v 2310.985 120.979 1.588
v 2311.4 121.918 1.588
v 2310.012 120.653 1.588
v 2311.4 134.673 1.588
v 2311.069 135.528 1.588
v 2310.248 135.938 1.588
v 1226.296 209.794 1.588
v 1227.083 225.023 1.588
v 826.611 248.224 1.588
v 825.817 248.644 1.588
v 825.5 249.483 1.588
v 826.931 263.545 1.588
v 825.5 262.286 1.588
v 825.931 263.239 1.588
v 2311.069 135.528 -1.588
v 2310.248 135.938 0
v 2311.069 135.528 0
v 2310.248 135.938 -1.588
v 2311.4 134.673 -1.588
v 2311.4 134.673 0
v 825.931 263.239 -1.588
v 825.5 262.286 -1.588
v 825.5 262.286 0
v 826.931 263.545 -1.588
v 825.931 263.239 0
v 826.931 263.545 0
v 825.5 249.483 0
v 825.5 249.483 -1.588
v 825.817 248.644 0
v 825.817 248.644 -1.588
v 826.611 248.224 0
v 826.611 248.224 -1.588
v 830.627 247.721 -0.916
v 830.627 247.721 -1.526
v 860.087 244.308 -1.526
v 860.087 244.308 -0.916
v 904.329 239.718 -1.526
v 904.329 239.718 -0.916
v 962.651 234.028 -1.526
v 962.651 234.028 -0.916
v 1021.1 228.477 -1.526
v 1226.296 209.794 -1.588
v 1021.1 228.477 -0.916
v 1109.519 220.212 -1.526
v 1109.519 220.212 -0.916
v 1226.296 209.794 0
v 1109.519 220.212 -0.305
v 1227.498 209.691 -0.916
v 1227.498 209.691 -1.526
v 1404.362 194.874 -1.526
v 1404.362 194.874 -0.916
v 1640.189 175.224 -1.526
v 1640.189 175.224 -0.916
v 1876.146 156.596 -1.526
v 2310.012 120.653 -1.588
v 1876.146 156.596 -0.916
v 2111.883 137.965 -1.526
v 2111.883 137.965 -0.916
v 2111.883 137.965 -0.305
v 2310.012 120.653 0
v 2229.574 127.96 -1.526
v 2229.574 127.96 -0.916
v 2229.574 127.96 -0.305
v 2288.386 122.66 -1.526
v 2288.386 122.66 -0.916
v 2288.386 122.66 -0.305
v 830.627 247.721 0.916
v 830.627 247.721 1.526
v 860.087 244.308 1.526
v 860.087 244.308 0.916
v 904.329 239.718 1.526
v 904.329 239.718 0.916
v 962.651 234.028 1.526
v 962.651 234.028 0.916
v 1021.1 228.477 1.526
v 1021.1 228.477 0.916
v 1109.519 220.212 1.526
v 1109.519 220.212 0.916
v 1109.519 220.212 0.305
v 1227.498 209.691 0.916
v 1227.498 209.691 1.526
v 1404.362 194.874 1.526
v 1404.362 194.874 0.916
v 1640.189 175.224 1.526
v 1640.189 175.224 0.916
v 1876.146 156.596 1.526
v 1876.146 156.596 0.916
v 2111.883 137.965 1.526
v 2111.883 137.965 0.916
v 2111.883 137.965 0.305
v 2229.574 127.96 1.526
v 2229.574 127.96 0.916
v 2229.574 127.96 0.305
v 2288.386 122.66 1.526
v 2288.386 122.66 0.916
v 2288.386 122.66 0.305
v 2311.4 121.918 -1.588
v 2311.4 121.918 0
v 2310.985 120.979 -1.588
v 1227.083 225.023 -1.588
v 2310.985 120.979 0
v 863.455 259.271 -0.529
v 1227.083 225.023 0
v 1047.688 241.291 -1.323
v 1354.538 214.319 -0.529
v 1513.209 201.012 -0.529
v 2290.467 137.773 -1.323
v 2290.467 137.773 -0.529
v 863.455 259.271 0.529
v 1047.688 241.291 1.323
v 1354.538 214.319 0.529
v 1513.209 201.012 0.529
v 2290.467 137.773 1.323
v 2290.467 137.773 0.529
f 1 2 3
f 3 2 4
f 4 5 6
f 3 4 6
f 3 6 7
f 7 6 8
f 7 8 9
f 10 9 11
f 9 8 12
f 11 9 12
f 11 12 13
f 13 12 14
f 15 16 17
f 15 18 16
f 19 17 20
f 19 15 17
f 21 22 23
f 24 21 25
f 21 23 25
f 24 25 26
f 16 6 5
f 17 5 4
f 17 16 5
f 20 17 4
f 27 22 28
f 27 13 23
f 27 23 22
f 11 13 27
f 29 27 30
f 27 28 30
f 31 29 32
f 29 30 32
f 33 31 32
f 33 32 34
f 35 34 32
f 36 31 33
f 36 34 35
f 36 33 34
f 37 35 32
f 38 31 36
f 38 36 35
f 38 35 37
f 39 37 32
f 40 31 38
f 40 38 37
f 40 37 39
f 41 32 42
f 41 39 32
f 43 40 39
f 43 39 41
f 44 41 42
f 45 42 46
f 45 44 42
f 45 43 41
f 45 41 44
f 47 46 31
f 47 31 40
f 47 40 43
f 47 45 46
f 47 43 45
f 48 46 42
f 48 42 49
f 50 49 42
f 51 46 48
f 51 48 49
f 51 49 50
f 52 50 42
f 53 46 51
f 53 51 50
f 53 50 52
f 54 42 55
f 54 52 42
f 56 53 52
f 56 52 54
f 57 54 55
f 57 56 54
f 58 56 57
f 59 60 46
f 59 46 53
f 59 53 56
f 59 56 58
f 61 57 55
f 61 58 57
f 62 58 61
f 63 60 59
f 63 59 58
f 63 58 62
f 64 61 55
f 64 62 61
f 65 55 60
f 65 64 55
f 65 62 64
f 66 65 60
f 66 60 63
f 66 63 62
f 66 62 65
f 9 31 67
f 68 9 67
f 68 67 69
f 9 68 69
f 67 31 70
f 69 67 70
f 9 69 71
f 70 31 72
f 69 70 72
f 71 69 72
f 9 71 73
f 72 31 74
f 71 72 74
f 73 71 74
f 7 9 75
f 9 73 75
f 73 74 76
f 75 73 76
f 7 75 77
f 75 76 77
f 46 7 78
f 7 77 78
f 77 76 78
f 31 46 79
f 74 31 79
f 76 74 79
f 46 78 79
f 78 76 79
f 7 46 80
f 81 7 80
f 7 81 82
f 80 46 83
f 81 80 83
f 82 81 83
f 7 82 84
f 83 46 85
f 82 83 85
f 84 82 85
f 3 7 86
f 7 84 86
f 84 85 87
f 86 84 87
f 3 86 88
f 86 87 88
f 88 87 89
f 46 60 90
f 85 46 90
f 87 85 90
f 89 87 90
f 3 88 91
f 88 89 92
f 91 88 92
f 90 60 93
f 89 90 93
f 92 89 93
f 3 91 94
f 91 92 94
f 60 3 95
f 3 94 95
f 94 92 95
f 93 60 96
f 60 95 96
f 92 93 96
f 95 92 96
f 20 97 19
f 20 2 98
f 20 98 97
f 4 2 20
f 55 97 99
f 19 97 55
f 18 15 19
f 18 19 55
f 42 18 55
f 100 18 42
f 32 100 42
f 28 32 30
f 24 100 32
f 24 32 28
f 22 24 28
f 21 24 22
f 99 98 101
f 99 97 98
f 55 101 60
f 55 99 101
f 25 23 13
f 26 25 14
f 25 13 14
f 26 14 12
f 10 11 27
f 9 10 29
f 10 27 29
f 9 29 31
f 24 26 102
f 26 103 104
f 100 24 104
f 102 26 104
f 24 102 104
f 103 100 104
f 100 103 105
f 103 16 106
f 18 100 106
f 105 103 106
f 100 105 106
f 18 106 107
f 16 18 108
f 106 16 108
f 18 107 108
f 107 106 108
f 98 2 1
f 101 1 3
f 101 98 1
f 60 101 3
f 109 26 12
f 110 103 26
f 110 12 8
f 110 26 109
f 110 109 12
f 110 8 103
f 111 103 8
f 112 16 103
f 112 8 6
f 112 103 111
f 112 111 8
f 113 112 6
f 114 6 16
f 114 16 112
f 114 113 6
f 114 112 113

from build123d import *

# Parameters (mm, degrees)
BOSS_EXTRUDE1_DEPTH = 1.5875
FILLET1_R           = 1.27


with BuildPart() as part:
    # Sketch2 → Boss-Extrude1 (new body, symmetric)
    with BuildSketch(Plane.XY):
        with BuildLine():
            add(Edge.make_bspline(
                [(825.5, 263.72872798), (833.004293944, 262.763036085), (840.535916247, 261.846014478), (848.126574562, 260.964164828), (892.90639318, 255.945629274), (937.686211733, 251.779150949), (973.452075064, 248.227669425), (1071.946672141, 239.051054038), (1170.441269319, 229.731506738), (1231.791940344, 224.503945813), (1324.899336146, 216.790627817), (1418.006730935, 209.040117978), (1449.742935921, 206.361809936), (1636.928606778, 190.521130342), (1824.114277635, 175.409157235), (1979.966947376, 164.299650253), (2139.396932204, 151.743219852), (2298.826916202, 137.00172879), (2303.011455291, 136.613290392), (2307.202438398, 136.22270903), (2311.4, 135.829939705)],
                knots=[78.681340958, 78.681340958, 78.681340958, 78.681340958, 78.681340958, 78.681340958, 82.46579272, 82.46579272, 82.46579272, 100.7932901, 100.7932901, 100.7932901, 131.0989539, 131.0989539, 131.0989539, 146.7691983, 146.7691983, 146.7691983, 223.5339586, 223.5339586, 223.5339586, 225.60075304, 225.60075304, 225.60075304, 225.60075304, 225.60075304, 225.60075304], degree=5))
            Line((825.5, 263.72872798), (825.5, 248.364439806))
            add(Edge.make_bspline(
                [(825.5, 248.364439806), (827.20768691, 248.14708351), (833.784664511, 247.321927102), (845.28106727, 245.953419483), (860.086531547, 244.295598067), (879.830703434, 242.186646028), (904.369967092, 239.698279806), (933.571022669, 236.832150625), (962.642718041, 234.023667741), (991.762593943, 231.241975908), (1021.072010315, 228.475862291), (1060.376437315, 224.796956681), (1109.513015577, 220.184378862), (1168.511190361, 214.817071985), (1227.500129793, 209.662054042), (1306.133167947, 203.021178328), (1404.361477105, 194.920725932), (1522.239851071, 184.918066624), (1640.182856491, 175.167007786), (1758.165352567, 165.757639485), (1876.155384769, 156.590937079), (1994.08749188, 147.453250142), (2092.268692061, 139.624216053), (2170.748029042, 133.079656729), (2219.771730977, 128.842227836), (2258.983988247, 125.347211495), (2286.236620906, 122.865952448), (2303.710498295, 121.243617864), (2311.4, 120.523308441)],
                knots=[78.875303138, 78.875303138, 78.875303138, 78.875303138, 79.386176103, 80.841530691, 82.29688528, 83.752239868, 86.662949044, 89.57365822, 92.484367397, 95.395076573, 98.305785749, 101.216494926, 107.037913278, 112.859331631, 118.680749984, 124.502168336, 136.145005042, 147.787841747, 159.430678452, 171.073515158, 182.716351863, 194.359188568, 206.002025273, 211.823443626, 217.644861979, 220.555571155, 223.466280331, 225.740445061, 225.740445061, 225.740445061, 225.740445061], degree=3))
            Line((2311.4, 120.523308441), (2311.4, 135.829939705))
        make_face()
    extrude(amount=BOSS_EXTRUDE1_DEPTH, both=True)

    # Fillet1
    fillet1_edges = [part.edges().sort_by_distance(p)[0] for p in [
        (2311.4, 120.523308441, -0.79375),
        (2311.4, 135.829939705, -0.79375),
        (825.5, 248.364439806, -0.79375),
        (825.5, 263.72872798, 0.79375),
    ]]
    fillet(fillet1_edges, radius=FILLET1_R)


solid = part.part
